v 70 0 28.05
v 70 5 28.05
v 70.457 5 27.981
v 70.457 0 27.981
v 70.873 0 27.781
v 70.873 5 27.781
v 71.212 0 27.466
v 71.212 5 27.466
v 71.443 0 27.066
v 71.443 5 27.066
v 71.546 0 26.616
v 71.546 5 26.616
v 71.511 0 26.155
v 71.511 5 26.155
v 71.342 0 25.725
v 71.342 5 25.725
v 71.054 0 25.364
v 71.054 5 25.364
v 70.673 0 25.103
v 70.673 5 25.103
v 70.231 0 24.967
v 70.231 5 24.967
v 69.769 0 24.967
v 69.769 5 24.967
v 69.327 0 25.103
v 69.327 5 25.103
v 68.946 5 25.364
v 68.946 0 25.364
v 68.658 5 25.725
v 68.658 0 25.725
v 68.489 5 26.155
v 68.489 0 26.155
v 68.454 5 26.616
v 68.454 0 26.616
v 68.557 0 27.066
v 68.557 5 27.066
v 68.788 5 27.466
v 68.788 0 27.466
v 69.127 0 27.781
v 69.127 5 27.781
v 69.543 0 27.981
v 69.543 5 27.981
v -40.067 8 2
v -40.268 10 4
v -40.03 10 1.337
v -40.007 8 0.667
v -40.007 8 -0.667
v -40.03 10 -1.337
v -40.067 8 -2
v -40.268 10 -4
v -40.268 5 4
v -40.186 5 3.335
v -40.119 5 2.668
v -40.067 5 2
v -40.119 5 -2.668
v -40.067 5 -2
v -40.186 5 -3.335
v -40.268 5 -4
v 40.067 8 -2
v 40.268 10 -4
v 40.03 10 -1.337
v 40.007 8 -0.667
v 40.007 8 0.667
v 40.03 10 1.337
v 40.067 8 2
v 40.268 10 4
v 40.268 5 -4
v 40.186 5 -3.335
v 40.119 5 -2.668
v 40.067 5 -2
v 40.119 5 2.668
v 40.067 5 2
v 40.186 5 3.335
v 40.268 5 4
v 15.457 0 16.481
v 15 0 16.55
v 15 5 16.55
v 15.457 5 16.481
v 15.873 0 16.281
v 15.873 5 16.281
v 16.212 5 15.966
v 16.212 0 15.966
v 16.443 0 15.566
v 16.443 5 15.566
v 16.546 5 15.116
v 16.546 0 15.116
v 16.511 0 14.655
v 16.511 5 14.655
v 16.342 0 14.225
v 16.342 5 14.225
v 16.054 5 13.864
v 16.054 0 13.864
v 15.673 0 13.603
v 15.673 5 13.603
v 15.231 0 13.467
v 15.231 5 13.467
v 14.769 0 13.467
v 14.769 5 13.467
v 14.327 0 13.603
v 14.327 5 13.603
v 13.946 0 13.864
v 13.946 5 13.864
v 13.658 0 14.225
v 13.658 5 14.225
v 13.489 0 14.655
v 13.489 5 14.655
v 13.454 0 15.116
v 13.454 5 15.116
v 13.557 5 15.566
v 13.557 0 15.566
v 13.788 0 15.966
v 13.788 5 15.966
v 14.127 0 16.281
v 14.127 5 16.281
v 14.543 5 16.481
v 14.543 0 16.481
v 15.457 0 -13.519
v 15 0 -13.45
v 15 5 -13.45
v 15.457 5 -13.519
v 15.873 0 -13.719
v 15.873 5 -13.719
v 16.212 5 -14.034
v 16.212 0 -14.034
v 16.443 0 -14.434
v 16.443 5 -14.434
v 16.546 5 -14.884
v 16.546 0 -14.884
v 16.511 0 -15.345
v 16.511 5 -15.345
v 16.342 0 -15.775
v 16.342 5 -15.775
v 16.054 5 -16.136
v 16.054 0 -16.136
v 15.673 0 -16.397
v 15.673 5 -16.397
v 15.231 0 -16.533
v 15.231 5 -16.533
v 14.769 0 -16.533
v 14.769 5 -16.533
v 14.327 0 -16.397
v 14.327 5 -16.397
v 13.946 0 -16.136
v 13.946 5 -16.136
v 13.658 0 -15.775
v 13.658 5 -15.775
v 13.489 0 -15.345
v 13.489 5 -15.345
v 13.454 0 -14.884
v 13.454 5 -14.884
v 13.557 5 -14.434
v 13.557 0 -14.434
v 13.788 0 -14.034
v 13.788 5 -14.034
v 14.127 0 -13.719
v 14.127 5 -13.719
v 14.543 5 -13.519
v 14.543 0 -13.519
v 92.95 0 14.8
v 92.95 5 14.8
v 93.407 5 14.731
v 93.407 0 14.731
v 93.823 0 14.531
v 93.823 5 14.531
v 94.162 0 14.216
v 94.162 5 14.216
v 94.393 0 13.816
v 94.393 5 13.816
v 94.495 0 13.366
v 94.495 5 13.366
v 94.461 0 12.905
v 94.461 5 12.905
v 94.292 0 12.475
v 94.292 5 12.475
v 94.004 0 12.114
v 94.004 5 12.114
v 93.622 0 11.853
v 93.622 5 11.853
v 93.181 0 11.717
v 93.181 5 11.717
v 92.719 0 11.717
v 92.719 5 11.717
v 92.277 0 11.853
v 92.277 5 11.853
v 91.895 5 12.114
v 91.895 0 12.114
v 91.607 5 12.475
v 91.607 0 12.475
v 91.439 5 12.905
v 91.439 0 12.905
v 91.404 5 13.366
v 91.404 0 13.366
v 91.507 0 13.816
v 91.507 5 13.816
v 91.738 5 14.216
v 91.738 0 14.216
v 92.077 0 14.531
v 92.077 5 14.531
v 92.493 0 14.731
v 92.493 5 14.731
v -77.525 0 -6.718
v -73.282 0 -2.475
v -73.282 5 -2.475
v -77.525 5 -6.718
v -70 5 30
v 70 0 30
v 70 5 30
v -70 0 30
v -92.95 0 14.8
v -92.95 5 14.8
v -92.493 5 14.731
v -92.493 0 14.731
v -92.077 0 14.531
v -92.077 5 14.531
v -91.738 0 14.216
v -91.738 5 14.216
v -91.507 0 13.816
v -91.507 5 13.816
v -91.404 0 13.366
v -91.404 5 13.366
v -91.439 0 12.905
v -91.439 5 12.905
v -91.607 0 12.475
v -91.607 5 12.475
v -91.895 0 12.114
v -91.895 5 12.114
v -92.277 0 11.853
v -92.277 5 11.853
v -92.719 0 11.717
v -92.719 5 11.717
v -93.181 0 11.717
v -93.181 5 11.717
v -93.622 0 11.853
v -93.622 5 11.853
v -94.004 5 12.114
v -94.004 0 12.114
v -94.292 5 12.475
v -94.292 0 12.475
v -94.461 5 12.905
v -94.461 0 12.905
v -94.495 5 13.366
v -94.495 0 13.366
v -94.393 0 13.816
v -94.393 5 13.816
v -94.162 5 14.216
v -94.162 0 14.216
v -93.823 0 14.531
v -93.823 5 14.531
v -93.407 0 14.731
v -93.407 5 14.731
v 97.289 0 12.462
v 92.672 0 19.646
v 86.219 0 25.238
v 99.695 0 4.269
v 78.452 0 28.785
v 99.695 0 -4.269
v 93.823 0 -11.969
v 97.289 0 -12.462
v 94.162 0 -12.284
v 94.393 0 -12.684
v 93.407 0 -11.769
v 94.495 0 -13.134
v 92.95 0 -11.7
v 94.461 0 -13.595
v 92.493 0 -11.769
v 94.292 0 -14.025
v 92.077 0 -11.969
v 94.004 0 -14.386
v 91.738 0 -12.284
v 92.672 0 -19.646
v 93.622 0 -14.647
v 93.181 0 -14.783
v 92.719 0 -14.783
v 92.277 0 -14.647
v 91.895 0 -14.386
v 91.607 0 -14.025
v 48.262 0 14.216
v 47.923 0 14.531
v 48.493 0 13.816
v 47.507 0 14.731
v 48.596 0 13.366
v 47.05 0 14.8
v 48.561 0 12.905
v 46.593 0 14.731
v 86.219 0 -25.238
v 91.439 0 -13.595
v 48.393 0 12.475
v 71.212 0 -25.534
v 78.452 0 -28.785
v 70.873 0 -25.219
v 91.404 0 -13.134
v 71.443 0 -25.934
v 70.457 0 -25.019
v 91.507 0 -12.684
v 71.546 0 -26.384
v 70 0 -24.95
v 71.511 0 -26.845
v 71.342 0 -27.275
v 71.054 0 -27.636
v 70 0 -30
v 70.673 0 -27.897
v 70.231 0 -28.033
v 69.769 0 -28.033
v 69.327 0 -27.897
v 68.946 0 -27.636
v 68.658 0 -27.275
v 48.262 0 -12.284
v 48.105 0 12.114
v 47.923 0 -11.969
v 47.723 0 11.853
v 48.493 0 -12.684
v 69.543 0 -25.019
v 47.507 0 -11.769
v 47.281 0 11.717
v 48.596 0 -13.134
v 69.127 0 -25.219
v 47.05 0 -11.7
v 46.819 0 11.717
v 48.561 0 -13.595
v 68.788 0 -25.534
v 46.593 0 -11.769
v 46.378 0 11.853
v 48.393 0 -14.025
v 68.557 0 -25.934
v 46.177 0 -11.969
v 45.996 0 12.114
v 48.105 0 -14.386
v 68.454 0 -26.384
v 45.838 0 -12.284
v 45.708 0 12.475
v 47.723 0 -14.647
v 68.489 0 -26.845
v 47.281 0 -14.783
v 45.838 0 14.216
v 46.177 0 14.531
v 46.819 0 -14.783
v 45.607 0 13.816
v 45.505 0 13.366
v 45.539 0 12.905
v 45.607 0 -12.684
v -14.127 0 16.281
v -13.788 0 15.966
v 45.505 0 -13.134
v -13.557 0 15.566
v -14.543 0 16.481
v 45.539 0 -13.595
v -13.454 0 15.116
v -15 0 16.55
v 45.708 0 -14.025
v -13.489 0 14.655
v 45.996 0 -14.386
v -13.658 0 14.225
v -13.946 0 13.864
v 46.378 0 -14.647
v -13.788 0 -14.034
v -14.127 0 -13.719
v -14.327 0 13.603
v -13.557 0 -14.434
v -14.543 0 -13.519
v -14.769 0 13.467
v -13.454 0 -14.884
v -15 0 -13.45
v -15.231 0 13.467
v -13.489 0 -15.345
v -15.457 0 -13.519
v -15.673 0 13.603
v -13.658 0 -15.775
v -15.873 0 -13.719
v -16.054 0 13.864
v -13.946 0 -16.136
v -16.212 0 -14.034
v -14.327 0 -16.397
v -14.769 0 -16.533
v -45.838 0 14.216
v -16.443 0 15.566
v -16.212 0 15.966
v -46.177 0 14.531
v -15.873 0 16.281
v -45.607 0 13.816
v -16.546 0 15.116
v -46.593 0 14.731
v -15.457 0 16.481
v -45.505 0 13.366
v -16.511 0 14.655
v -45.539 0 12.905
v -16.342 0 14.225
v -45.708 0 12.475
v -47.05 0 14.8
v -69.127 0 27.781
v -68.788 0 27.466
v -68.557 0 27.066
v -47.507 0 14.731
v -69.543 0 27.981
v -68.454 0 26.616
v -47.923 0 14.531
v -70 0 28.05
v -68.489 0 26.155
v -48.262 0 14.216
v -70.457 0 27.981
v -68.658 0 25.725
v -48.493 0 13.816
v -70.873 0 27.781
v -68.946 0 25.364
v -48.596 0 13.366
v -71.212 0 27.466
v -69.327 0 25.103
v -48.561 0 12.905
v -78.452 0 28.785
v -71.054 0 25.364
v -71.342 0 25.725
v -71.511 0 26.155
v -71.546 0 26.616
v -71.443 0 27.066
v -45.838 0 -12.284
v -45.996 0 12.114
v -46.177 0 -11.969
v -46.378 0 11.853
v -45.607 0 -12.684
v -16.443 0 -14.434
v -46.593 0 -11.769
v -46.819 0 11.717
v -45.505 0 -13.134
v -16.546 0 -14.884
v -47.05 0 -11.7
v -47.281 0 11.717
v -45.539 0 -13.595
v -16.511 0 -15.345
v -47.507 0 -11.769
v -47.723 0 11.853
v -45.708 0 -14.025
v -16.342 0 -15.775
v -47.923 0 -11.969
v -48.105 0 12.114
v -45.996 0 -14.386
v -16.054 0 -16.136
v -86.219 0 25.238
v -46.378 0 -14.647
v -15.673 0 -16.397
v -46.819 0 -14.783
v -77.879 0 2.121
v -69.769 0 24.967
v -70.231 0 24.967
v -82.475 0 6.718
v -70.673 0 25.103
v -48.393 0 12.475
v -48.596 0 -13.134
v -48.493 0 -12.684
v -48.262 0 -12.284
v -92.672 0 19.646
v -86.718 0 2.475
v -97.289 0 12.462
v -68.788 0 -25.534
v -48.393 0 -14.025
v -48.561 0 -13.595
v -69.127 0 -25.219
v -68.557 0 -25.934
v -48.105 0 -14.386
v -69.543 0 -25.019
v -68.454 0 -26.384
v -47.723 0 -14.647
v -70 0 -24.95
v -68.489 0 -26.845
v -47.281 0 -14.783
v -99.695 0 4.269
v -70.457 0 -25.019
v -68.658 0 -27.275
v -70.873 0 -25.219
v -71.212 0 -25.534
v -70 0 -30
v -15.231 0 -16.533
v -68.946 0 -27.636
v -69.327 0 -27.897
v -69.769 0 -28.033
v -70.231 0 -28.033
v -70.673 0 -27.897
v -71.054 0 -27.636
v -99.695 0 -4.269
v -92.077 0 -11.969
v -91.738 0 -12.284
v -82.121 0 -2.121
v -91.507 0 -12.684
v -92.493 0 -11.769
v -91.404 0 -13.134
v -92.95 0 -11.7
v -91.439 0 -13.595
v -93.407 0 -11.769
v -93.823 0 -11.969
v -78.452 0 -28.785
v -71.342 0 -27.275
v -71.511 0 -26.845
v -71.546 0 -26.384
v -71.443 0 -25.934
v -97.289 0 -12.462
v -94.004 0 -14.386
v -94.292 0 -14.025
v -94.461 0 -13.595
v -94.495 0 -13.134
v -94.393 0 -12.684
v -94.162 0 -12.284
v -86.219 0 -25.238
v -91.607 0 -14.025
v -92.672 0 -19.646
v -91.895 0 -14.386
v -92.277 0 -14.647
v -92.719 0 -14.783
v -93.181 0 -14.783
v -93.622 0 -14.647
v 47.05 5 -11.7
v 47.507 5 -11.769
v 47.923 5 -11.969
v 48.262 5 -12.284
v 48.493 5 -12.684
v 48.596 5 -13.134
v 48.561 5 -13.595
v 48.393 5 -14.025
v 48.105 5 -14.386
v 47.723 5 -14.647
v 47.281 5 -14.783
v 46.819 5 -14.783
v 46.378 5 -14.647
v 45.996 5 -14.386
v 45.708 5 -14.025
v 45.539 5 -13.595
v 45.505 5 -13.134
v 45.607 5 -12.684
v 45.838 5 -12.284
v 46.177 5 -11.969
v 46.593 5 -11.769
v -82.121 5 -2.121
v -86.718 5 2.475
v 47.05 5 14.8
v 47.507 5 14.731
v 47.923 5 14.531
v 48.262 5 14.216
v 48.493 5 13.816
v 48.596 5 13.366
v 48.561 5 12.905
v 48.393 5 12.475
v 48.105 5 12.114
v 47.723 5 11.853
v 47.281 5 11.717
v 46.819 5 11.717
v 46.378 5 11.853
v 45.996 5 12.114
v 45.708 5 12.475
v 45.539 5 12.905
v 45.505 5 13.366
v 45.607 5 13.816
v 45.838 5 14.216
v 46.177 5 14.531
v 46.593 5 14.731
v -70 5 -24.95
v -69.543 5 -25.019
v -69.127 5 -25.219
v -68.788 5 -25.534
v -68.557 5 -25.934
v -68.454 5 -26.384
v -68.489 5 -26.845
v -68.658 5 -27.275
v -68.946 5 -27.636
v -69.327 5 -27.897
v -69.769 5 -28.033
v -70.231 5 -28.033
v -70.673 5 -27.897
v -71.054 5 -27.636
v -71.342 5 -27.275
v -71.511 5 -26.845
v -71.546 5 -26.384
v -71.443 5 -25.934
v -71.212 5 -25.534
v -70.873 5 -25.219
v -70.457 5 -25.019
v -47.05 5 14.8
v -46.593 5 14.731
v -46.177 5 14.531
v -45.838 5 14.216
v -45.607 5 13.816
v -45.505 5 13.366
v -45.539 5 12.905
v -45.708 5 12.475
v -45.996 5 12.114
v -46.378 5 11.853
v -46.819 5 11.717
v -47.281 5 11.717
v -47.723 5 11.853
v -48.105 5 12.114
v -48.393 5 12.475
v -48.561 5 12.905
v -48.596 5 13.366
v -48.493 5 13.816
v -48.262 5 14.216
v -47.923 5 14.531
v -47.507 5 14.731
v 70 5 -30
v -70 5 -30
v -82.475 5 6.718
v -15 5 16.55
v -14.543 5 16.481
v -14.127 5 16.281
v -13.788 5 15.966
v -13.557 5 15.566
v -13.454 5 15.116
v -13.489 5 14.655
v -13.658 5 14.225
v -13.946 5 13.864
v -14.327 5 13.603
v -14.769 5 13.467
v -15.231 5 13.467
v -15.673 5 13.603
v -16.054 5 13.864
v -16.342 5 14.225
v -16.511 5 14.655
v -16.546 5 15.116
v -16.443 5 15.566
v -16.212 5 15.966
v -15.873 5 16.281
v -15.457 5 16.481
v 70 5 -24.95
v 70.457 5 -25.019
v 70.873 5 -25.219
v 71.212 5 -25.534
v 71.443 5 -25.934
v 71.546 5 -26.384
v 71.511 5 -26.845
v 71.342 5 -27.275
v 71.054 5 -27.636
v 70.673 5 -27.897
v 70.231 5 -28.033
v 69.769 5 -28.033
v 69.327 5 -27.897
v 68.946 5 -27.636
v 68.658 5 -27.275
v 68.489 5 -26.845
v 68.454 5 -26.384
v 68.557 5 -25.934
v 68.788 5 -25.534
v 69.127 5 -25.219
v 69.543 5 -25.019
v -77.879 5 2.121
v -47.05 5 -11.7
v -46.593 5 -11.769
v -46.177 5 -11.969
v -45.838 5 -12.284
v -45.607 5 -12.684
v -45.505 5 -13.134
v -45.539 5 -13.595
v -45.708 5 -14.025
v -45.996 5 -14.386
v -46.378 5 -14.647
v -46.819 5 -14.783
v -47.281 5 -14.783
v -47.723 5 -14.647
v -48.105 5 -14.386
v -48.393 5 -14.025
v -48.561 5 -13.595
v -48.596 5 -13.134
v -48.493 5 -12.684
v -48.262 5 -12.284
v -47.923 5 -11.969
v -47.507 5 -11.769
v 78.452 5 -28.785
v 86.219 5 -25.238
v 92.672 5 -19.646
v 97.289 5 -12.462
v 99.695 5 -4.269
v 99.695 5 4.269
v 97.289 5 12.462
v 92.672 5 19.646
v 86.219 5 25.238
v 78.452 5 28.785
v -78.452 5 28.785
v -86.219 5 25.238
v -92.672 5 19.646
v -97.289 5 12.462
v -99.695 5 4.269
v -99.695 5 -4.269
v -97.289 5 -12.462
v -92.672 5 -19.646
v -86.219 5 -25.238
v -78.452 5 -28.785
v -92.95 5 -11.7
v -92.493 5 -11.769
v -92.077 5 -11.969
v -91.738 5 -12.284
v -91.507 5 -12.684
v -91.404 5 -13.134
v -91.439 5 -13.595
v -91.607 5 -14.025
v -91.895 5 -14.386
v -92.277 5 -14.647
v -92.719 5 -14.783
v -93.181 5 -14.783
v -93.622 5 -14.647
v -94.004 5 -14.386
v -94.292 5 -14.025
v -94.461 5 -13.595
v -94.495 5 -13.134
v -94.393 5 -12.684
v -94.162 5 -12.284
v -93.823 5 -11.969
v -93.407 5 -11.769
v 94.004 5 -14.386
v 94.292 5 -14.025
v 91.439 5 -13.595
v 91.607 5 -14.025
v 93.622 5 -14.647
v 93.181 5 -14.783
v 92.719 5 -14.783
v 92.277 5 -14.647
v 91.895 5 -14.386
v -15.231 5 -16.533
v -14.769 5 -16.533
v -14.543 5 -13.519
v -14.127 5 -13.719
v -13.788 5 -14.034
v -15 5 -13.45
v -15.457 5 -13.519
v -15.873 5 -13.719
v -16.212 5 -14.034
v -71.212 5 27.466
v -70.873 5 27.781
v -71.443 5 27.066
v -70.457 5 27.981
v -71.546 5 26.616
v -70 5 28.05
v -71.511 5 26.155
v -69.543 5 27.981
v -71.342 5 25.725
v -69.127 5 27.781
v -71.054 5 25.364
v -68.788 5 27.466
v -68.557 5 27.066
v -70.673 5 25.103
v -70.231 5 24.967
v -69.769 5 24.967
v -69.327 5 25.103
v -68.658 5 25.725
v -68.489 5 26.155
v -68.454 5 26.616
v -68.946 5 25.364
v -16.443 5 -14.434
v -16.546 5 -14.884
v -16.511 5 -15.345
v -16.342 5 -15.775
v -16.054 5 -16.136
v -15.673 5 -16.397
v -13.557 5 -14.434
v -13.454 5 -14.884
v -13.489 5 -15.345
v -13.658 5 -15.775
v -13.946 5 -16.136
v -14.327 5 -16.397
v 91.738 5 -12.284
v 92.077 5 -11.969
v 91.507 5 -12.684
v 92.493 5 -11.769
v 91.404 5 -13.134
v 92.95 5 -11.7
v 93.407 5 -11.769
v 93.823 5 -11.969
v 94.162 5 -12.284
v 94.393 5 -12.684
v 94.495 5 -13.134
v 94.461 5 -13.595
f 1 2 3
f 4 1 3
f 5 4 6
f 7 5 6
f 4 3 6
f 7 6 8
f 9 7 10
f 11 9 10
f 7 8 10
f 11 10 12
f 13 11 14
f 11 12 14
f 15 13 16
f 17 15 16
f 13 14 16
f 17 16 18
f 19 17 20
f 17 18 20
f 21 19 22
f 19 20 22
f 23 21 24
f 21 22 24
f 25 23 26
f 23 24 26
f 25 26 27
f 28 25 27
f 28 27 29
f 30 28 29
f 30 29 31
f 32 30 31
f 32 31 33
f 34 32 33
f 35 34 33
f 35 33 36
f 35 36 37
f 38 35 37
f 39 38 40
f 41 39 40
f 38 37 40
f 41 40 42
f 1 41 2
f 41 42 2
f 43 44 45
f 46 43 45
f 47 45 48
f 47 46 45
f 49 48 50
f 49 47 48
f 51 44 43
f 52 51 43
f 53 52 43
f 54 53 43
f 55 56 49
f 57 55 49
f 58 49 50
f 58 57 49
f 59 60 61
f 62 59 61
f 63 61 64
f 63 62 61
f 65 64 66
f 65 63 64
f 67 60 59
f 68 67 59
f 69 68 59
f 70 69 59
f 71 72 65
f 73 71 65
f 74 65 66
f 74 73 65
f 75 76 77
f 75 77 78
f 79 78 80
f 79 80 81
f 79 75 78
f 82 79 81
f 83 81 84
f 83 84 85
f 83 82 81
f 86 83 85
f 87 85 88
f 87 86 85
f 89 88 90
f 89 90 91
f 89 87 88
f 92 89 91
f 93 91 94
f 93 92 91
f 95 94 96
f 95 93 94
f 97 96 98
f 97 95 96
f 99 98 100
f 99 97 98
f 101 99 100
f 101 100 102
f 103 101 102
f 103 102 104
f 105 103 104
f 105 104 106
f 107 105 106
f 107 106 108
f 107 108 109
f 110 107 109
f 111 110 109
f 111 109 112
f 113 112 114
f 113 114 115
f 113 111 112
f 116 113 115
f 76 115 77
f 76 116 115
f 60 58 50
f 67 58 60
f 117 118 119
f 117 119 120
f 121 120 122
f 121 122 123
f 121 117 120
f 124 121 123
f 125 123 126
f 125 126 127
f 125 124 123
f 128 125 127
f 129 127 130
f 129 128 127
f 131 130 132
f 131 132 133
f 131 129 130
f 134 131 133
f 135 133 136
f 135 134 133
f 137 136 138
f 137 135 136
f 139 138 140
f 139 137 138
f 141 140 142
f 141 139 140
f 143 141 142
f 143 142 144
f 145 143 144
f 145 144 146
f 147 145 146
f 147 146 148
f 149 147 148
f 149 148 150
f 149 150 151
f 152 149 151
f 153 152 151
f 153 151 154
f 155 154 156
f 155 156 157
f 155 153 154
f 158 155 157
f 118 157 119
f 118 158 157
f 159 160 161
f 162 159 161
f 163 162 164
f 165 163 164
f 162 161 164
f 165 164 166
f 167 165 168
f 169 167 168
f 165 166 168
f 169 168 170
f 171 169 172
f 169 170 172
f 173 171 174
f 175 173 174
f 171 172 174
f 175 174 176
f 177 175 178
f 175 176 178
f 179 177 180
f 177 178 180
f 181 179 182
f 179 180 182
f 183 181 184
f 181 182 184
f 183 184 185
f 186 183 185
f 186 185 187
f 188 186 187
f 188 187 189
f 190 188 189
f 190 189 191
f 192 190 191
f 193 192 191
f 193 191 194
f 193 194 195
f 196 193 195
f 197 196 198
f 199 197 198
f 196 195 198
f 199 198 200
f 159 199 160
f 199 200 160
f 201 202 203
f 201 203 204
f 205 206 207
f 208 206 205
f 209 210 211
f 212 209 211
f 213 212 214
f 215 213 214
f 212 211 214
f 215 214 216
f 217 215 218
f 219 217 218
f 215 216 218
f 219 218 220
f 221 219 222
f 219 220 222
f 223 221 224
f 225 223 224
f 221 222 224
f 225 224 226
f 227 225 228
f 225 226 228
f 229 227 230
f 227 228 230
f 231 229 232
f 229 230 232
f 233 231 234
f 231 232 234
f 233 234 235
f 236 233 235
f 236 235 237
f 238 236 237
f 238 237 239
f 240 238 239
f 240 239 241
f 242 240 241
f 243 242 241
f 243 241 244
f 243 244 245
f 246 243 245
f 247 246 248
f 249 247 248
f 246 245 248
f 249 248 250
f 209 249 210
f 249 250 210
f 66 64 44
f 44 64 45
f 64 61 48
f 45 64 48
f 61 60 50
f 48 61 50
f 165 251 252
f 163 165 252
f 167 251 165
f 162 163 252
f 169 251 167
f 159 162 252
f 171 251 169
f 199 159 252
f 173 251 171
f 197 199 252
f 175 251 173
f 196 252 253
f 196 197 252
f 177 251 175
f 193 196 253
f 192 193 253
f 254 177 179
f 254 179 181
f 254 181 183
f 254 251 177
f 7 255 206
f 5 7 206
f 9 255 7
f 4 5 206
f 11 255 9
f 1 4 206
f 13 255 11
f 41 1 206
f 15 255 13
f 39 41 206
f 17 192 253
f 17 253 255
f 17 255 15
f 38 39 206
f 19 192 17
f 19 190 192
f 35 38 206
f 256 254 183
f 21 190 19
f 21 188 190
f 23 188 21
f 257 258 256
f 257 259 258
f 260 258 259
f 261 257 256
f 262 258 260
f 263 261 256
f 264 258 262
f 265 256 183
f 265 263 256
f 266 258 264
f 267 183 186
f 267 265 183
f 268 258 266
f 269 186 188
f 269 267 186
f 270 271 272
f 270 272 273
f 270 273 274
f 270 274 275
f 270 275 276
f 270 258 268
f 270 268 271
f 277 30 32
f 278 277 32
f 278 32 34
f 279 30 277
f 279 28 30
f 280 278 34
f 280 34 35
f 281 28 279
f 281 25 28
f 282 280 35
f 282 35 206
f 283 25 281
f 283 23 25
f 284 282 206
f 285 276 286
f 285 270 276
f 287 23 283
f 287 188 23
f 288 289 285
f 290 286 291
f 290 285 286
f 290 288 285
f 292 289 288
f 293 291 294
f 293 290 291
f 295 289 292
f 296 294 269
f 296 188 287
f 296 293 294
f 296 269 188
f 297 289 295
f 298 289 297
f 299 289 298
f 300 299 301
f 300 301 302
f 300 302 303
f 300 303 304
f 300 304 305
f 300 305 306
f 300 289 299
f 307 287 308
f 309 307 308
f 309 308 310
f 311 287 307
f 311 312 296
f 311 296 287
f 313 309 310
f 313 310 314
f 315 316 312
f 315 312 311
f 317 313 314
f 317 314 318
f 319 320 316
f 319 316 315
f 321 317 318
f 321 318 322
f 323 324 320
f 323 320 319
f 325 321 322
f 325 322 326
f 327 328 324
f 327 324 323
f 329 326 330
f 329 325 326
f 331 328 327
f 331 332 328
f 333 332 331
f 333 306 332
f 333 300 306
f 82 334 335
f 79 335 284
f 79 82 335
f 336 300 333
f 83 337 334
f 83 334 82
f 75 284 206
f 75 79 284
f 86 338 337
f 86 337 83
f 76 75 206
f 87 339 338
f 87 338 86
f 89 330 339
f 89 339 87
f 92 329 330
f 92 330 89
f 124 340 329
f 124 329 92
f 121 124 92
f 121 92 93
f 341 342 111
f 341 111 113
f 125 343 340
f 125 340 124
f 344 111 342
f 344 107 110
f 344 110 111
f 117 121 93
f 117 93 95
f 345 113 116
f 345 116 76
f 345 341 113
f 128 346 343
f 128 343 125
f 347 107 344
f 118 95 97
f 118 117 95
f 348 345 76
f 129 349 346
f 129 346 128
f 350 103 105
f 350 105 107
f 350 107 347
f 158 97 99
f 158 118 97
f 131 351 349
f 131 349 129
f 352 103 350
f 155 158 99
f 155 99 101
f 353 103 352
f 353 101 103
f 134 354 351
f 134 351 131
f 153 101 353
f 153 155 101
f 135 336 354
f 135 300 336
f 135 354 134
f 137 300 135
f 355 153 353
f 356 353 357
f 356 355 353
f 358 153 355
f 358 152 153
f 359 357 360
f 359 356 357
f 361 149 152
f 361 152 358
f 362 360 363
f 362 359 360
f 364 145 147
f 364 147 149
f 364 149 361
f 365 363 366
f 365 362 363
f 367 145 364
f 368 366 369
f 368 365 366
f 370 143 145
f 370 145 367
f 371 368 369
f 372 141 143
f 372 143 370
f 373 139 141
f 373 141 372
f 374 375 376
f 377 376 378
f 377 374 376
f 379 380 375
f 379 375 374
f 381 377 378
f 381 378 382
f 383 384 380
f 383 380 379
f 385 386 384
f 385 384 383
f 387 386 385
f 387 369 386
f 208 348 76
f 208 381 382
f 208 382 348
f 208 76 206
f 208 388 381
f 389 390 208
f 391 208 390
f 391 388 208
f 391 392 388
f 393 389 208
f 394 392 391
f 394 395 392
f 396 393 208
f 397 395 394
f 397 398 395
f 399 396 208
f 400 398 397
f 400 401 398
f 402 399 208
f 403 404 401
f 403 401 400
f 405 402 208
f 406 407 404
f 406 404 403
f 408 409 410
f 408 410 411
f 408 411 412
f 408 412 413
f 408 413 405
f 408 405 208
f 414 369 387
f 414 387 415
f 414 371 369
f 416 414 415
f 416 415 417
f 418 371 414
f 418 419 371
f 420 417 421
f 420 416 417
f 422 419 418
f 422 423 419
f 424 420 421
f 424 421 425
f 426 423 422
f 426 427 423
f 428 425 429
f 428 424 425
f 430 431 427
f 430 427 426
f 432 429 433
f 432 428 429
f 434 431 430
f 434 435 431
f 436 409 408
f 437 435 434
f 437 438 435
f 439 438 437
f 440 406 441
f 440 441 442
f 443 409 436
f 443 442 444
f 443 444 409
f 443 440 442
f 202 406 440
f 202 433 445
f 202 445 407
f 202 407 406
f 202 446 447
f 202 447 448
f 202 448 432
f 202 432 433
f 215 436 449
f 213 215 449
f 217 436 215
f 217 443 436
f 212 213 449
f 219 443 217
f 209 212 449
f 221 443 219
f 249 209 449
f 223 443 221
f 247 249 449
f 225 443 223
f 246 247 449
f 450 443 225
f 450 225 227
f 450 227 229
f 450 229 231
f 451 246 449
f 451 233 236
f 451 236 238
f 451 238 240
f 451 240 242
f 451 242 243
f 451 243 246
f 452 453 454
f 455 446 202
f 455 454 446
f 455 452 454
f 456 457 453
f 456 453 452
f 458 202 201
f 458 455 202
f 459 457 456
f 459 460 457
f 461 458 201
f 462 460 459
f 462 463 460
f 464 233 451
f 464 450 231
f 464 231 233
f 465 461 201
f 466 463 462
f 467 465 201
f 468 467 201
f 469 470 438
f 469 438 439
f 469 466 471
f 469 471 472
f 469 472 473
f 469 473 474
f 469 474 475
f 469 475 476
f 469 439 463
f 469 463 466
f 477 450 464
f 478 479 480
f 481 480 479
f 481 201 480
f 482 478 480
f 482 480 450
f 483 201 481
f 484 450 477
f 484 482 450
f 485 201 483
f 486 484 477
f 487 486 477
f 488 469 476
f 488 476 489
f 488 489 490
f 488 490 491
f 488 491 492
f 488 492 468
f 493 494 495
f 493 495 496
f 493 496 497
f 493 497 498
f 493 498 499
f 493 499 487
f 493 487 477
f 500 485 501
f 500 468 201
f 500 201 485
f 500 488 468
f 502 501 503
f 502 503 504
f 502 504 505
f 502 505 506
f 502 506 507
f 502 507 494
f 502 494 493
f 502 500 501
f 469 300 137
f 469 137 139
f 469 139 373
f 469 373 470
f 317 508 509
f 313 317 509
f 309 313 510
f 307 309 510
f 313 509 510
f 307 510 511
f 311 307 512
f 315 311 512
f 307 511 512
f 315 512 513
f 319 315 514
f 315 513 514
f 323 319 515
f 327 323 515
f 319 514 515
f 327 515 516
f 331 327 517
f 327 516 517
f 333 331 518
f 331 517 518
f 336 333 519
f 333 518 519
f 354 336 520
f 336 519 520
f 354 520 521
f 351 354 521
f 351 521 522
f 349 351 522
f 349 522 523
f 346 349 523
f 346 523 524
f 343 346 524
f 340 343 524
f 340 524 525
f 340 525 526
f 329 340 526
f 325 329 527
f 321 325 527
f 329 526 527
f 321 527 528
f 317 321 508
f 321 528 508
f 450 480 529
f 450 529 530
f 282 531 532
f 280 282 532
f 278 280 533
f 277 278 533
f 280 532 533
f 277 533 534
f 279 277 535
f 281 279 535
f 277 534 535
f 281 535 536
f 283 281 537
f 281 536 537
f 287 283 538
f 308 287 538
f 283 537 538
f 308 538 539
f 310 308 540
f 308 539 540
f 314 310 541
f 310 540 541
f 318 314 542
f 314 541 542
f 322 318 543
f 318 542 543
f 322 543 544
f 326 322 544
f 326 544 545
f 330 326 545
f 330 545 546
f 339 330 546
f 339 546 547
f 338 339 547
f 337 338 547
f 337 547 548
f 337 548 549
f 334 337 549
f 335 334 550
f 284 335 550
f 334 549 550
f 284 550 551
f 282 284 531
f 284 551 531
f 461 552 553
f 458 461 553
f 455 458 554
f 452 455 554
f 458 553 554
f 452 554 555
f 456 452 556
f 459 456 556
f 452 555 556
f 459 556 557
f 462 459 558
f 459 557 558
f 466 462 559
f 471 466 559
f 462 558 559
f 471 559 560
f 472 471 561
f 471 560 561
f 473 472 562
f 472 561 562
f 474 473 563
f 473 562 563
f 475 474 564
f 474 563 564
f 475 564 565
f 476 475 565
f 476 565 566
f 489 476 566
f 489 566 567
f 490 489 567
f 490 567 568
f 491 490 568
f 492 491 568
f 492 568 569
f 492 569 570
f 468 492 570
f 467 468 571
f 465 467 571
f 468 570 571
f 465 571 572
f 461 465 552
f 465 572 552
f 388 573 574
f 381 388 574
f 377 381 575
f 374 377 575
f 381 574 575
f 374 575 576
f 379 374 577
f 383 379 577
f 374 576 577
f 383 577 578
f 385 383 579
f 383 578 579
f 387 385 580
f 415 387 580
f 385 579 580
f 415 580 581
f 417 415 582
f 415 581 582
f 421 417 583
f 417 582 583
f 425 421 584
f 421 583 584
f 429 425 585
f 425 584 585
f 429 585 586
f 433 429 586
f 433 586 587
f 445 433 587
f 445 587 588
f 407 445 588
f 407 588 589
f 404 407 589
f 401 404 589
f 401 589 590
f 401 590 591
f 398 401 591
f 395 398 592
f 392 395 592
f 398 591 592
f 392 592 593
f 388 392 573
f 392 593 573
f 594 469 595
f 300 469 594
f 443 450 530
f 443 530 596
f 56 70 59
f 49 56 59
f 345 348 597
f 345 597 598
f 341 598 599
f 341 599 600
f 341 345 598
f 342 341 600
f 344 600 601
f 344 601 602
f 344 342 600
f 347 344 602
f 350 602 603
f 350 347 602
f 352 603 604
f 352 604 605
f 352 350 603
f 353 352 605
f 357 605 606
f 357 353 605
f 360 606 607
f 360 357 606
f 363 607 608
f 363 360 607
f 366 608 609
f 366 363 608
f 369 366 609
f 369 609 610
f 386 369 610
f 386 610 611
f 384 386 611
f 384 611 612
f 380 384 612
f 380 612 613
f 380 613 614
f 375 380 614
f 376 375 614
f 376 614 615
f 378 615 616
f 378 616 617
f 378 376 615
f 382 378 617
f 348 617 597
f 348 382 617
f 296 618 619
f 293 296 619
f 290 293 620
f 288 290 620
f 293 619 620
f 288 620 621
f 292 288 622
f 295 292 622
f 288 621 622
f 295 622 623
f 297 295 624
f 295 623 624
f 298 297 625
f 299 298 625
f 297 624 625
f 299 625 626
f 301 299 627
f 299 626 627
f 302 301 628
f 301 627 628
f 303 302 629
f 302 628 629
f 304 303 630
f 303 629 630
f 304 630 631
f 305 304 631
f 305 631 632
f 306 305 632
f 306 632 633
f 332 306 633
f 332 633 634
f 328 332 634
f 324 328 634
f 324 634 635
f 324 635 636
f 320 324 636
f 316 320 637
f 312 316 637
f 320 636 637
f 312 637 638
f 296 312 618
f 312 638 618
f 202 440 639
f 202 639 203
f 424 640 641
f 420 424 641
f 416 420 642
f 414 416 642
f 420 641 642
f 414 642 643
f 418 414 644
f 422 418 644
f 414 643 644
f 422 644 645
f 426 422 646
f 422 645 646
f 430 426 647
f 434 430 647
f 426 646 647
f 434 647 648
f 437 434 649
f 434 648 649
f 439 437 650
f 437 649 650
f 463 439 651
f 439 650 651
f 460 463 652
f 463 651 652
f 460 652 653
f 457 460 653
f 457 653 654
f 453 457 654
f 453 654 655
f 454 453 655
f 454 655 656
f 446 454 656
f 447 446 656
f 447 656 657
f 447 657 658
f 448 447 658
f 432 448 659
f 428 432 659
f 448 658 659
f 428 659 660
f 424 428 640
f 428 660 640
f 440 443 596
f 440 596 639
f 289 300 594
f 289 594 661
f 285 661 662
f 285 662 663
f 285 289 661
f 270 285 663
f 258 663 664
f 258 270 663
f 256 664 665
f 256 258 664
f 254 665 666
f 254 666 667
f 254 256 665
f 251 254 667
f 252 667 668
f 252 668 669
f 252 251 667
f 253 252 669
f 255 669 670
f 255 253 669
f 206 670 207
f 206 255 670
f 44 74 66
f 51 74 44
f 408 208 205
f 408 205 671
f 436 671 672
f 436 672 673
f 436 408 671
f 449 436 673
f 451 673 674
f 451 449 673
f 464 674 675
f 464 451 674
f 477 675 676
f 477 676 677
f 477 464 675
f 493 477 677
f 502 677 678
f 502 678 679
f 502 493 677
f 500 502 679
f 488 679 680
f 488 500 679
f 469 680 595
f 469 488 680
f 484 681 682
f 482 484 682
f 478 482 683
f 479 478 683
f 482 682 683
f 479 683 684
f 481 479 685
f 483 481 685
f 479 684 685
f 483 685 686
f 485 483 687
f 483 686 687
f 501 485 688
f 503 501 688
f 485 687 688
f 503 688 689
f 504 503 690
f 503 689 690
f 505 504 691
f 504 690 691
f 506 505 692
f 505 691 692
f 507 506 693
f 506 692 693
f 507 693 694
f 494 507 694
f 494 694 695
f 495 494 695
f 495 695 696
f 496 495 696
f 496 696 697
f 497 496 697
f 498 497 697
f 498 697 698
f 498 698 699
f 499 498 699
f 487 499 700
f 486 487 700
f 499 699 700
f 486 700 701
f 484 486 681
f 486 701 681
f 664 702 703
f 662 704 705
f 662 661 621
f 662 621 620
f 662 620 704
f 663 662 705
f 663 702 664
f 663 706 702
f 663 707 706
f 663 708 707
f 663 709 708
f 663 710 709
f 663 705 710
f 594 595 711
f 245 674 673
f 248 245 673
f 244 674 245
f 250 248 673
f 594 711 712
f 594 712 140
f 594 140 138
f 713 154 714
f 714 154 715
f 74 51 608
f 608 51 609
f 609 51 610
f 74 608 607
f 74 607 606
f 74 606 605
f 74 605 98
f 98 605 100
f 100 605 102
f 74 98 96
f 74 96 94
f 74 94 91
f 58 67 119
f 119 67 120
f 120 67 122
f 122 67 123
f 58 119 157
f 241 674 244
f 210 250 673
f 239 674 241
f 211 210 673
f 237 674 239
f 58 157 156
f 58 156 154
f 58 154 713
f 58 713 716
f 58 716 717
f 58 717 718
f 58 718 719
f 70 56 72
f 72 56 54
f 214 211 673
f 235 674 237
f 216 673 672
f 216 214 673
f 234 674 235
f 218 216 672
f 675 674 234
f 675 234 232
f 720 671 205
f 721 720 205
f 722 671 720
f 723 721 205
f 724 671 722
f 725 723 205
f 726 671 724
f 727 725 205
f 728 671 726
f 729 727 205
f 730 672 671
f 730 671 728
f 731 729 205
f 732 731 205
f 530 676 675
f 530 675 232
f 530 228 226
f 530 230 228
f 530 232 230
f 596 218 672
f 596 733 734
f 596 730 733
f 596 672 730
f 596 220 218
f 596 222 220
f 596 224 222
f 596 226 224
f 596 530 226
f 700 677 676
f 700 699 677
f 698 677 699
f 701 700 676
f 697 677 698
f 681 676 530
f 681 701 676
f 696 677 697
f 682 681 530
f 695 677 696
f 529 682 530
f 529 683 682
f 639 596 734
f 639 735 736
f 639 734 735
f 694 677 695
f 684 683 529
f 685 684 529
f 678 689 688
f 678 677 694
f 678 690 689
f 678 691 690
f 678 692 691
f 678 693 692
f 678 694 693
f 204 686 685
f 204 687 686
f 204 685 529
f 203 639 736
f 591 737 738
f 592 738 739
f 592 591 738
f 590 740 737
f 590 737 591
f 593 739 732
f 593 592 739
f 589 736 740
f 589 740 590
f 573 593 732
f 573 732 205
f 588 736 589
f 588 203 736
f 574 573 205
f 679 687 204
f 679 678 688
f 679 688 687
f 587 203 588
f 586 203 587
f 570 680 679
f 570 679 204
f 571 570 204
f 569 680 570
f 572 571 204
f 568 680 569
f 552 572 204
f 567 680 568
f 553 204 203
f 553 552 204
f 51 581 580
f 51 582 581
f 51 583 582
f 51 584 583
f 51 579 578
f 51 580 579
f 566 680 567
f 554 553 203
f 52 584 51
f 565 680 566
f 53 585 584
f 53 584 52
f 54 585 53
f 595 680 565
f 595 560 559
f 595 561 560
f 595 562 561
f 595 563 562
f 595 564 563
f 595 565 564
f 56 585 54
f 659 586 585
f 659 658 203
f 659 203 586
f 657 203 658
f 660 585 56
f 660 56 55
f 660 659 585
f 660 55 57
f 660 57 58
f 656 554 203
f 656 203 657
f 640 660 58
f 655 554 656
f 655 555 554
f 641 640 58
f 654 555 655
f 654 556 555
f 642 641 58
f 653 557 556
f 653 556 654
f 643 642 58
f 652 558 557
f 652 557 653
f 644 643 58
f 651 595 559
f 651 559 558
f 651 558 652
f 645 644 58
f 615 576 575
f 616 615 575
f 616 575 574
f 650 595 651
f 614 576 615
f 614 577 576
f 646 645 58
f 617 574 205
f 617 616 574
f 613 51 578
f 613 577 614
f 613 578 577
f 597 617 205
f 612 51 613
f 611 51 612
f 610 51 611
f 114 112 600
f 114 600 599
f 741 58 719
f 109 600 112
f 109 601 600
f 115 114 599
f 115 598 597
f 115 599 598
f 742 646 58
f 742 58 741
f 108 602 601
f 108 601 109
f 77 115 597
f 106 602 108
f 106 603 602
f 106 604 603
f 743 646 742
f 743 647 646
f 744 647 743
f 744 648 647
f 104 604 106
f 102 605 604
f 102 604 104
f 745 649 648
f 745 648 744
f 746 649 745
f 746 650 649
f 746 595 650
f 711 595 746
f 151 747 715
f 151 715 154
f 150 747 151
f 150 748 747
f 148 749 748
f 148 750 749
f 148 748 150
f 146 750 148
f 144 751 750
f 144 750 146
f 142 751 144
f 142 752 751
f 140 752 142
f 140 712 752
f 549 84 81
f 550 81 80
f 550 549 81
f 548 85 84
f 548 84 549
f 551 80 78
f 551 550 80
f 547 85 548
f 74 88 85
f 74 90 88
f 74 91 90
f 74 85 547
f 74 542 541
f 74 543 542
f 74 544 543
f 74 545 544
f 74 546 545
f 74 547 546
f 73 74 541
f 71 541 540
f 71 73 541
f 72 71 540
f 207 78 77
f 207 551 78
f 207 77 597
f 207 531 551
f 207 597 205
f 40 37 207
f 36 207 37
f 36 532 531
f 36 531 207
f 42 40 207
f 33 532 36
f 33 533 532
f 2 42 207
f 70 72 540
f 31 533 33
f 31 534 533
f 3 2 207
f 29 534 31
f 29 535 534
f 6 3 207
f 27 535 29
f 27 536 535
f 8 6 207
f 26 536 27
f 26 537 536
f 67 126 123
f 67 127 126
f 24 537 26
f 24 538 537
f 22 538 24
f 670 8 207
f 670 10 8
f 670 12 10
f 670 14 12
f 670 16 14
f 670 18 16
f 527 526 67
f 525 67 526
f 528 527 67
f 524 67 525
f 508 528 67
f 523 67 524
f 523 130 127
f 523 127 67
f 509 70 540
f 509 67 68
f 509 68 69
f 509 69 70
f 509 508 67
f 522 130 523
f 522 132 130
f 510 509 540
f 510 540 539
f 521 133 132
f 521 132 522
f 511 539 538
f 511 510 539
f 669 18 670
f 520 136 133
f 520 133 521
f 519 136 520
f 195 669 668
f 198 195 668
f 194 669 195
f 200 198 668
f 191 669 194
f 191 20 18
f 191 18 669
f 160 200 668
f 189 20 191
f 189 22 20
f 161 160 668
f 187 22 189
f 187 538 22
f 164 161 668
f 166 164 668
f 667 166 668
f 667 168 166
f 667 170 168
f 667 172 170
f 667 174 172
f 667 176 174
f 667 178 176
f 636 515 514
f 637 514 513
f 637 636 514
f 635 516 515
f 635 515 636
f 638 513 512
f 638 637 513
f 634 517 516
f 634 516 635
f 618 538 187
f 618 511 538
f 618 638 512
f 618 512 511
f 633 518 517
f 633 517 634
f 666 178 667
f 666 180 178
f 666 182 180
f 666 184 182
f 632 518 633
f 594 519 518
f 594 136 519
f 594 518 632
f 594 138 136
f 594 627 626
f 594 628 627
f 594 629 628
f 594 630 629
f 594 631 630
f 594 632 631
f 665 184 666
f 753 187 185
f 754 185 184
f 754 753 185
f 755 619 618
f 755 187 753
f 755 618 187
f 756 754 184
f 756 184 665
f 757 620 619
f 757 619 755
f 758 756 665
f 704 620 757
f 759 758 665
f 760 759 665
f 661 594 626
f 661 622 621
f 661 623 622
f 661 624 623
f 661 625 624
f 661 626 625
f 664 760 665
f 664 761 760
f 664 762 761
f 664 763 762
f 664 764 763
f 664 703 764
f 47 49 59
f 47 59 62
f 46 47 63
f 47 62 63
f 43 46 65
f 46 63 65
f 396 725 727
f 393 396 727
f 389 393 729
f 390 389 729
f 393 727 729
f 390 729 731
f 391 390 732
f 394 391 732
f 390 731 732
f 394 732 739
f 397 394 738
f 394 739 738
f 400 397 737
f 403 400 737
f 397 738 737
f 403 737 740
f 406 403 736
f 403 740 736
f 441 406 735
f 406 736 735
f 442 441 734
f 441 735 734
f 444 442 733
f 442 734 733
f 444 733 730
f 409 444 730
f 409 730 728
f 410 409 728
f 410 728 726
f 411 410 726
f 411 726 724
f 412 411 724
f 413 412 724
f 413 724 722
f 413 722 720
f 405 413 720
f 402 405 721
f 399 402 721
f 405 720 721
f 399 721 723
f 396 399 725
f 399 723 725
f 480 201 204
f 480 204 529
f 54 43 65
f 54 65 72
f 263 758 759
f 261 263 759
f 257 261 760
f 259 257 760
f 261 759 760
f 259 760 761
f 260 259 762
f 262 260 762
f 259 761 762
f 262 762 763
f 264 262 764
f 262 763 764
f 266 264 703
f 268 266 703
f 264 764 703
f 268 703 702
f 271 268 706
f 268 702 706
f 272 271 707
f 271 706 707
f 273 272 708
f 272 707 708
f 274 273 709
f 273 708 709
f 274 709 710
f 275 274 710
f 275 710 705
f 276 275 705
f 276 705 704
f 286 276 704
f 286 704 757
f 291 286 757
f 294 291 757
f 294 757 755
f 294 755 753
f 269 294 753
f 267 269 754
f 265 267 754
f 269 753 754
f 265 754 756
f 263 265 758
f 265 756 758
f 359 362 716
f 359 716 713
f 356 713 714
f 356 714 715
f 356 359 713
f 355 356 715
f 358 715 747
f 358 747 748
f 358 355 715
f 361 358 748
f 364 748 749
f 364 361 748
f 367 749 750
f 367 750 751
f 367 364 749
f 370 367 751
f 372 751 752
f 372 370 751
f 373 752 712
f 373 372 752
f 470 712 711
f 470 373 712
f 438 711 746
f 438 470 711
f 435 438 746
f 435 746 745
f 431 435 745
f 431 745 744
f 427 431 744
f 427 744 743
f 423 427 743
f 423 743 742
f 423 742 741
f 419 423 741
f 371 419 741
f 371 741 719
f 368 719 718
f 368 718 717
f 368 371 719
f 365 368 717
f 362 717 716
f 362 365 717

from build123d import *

# Parameters (mm, degrees)
SKETCH_1_R          = 1.55
EXTRUDE_2_DEPTH     = 5
SKETCH_2_R          = 1.55
CUT_EXTRUDE_2_DEPTH = 5
SKETCH_3_W          = 20
SKETCH_3_H          = 20
EXTRUDE_4_DEPTH     = 5
EXTRUDE_5_DEPTH     = 5
EXTRUDE_6_DEPTH     = 5
CUT_EXTRUDE_3_DEPTH = 150
SKETCH_8_W          = 8
SKETCH_8_H          = 5
CUT_EXTRUDE_4_DEPTH = 10
CUT_EXTRUDE_5_DEPTH = 10


with BuildPart() as part:
    # 草图1 → 凸台-拉伸2 (new body)
    with BuildSketch(Plane(origin=(0, 0, 0), x_dir=(1, 0, 0), z_dir=(0, 1, 0))):
        with BuildLine():
            Line((-70, 30), (70, 30))
            ThreePointArc((70, 30), (100, 0), (70, -30))
            Line((70, -30), (-70, -30))
            ThreePointArc((-70, -30), (-100, 0), (-70, 30))
        make_face()
        with Locations(Location((-15, 15, 0), (0, 0, 270))):
            Circle(SKETCH_1_R, mode=Mode.SUBTRACT)
        with Locations(Location((15, 15, 0), (0, 0, 270))):
            Circle(SKETCH_1_R, mode=Mode.SUBTRACT)
        with Locations(Location((15, -15, 0), (0, 0, 270))):
            Circle(SKETCH_1_R, mode=Mode.SUBTRACT)
        with Locations(Location((-15, -15, 0), (0, 0, 270))):
            Circle(SKETCH_1_R, mode=Mode.SUBTRACT)
        Polygon((-90, 0), (-90, 10), (-70, 10), (-70, -10), (-90, -10), align=None, mode=Mode.SUBTRACT)
        Polygon((90, 0), (90, 10), (70, 10), (70, -10), (90, -10), align=None, mode=Mode.SUBTRACT)
    extrude(amount=EXTRUDE_2_DEPTH)

    # 草图2 → 切除-拉伸2 (cut)
    with BuildSketch(Plane(origin=(0, 5, 0), x_dir=(1, 0, 0), z_dir=(0, 1, 0))):
        with Locations(Location((-70, 26.5, 0), (0, 0, 270))):
            Circle(SKETCH_2_R)
        with Locations(Location((-92.9496732, 13.25, 0), (0, 0, 270))):
            Circle(SKETCH_2_R)
        with Locations(Location((-92.9496732, -13.25, 0), (0, 0, 270))):
            Circle(SKETCH_2_R)
        with Locations(Location((-70, -26.5, 0), (0, 0, 270))):
            Circle(SKETCH_2_R)
        with Locations(Location((-47.0503268, -13.25, 0), (0, 0, 270))):
            Circle(SKETCH_2_R)
        with Locations(Location((-47.0503268, 13.25, 0), (0, 0, 270))):
            Circle(SKETCH_2_R)
        with Locations(Location((92.9496732, 13.25, 0), (0, 0, 270))):
            Circle(SKETCH_2_R)
        with Locations(Location((92.9496732, -13.25, 0), (0, 0, 270))):
            Circle(SKETCH_2_R)
        with Locations(Location((70, -26.5, 0), (0, 0, 270))):
            Circle(SKETCH_2_R)
        with Locations(Location((47.0503268, -13.25, 0), (0, 0, 270))):
            Circle(SKETCH_2_R)
        with Locations(Location((47.0503268, 13.25, 0), (0, 0, 270))):
            Circle(SKETCH_2_R)
        with Locations(Location((70, 26.5, 0), (0, 0, 270))):
            Circle(SKETCH_2_R)
    extrude(amount=-CUT_EXTRUDE_2_DEPTH, mode=Mode.SUBTRACT)

    # 草图3 → 凸台-拉伸4 (add)
    with BuildSketch(Plane(origin=(0, 5, 0), x_dir=(1, 0, 0), z_dir=(0, 1, 0))):
        with Locations((-80, 0)):
            Rectangle(SKETCH_3_W, SKETCH_3_H)
        with Locations((80, 0)):
            Rectangle(SKETCH_3_W, SKETCH_3_H)
    extrude(amount=-EXTRUDE_4_DEPTH)

    # 草图4 → 凸台-拉伸5 (add)
    with BuildSketch(Plane(origin=(0, 5, 0), x_dir=(1, 0, 0), z_dir=(0, 1, 0))):
        with BuildLine():
            Line((0, 4), (40.267862505, 4))
            ThreePointArc((40.267862505, 4), (40, 0), (40.267862505, -4))
            Line((40.267862505, -4), (0, -4))
            Line((0, -4), (-40.267862505, -4))
            ThreePointArc((-40.267862505, -4), (-40, 0), (-40.267862505, 4))
            Line((-40.267862505, 4), (0, 4))
        make_face()
    extrude(amount=EXTRUDE_5_DEPTH)

    # 草图6 → 凸台-拉伸6 (add)
    with BuildSketch(Plane(origin=(0, 5, 0), x_dir=(1, 0, 0), z_dir=(0, 1, 0))):
        Polygon((63.550267448, 4), (70, 4), (70, 0), (70, -4), (63.550267448, -4), align=None)
    extrude(amount=EXTRUDE_6_DEPTH)

    # 草图7 → 切除-拉伸3 (cut)
    with BuildSketch(Plane(origin=(70, 0, 0), x_dir=(0, 0, -1), z_dir=(1, 0, 0))):
        Polygon((2, 8), (0, 8), (-2, 8), (-2, 5), (0, 5), (2, 5), align=None)
    extrude(amount=-CUT_EXTRUDE_3_DEPTH, mode=Mode.SUBTRACT)

    # 草图8 → 切除-拉伸4 (cut)
    with BuildSketch(Plane(origin=(70, 0, 0), x_dir=(0, 0, -1), z_dir=(1, 0, 0))):
        with Locations((0, 7.5)):
            Rectangle(SKETCH_8_W, SKETCH_8_H)
    extrude(amount=-CUT_EXTRUDE_4_DEPTH, mode=Mode.SUBTRACT)

    # 草图9 → 切除-拉伸5 (cut)
    with BuildSketch(Plane.XZ):
        Polygon((-82.121320344, -2.121320344), (-86.717514421, 2.474873734), (-82.474873734, 6.717514421), (-77.878679656, 2.121320344), (-73.282485579, -2.474873734), (-77.525126266, -6.717514421), align=None)
    extrude(amount=-CUT_EXTRUDE_5_DEPTH, mode=Mode.SUBTRACT)


solid = part.part
